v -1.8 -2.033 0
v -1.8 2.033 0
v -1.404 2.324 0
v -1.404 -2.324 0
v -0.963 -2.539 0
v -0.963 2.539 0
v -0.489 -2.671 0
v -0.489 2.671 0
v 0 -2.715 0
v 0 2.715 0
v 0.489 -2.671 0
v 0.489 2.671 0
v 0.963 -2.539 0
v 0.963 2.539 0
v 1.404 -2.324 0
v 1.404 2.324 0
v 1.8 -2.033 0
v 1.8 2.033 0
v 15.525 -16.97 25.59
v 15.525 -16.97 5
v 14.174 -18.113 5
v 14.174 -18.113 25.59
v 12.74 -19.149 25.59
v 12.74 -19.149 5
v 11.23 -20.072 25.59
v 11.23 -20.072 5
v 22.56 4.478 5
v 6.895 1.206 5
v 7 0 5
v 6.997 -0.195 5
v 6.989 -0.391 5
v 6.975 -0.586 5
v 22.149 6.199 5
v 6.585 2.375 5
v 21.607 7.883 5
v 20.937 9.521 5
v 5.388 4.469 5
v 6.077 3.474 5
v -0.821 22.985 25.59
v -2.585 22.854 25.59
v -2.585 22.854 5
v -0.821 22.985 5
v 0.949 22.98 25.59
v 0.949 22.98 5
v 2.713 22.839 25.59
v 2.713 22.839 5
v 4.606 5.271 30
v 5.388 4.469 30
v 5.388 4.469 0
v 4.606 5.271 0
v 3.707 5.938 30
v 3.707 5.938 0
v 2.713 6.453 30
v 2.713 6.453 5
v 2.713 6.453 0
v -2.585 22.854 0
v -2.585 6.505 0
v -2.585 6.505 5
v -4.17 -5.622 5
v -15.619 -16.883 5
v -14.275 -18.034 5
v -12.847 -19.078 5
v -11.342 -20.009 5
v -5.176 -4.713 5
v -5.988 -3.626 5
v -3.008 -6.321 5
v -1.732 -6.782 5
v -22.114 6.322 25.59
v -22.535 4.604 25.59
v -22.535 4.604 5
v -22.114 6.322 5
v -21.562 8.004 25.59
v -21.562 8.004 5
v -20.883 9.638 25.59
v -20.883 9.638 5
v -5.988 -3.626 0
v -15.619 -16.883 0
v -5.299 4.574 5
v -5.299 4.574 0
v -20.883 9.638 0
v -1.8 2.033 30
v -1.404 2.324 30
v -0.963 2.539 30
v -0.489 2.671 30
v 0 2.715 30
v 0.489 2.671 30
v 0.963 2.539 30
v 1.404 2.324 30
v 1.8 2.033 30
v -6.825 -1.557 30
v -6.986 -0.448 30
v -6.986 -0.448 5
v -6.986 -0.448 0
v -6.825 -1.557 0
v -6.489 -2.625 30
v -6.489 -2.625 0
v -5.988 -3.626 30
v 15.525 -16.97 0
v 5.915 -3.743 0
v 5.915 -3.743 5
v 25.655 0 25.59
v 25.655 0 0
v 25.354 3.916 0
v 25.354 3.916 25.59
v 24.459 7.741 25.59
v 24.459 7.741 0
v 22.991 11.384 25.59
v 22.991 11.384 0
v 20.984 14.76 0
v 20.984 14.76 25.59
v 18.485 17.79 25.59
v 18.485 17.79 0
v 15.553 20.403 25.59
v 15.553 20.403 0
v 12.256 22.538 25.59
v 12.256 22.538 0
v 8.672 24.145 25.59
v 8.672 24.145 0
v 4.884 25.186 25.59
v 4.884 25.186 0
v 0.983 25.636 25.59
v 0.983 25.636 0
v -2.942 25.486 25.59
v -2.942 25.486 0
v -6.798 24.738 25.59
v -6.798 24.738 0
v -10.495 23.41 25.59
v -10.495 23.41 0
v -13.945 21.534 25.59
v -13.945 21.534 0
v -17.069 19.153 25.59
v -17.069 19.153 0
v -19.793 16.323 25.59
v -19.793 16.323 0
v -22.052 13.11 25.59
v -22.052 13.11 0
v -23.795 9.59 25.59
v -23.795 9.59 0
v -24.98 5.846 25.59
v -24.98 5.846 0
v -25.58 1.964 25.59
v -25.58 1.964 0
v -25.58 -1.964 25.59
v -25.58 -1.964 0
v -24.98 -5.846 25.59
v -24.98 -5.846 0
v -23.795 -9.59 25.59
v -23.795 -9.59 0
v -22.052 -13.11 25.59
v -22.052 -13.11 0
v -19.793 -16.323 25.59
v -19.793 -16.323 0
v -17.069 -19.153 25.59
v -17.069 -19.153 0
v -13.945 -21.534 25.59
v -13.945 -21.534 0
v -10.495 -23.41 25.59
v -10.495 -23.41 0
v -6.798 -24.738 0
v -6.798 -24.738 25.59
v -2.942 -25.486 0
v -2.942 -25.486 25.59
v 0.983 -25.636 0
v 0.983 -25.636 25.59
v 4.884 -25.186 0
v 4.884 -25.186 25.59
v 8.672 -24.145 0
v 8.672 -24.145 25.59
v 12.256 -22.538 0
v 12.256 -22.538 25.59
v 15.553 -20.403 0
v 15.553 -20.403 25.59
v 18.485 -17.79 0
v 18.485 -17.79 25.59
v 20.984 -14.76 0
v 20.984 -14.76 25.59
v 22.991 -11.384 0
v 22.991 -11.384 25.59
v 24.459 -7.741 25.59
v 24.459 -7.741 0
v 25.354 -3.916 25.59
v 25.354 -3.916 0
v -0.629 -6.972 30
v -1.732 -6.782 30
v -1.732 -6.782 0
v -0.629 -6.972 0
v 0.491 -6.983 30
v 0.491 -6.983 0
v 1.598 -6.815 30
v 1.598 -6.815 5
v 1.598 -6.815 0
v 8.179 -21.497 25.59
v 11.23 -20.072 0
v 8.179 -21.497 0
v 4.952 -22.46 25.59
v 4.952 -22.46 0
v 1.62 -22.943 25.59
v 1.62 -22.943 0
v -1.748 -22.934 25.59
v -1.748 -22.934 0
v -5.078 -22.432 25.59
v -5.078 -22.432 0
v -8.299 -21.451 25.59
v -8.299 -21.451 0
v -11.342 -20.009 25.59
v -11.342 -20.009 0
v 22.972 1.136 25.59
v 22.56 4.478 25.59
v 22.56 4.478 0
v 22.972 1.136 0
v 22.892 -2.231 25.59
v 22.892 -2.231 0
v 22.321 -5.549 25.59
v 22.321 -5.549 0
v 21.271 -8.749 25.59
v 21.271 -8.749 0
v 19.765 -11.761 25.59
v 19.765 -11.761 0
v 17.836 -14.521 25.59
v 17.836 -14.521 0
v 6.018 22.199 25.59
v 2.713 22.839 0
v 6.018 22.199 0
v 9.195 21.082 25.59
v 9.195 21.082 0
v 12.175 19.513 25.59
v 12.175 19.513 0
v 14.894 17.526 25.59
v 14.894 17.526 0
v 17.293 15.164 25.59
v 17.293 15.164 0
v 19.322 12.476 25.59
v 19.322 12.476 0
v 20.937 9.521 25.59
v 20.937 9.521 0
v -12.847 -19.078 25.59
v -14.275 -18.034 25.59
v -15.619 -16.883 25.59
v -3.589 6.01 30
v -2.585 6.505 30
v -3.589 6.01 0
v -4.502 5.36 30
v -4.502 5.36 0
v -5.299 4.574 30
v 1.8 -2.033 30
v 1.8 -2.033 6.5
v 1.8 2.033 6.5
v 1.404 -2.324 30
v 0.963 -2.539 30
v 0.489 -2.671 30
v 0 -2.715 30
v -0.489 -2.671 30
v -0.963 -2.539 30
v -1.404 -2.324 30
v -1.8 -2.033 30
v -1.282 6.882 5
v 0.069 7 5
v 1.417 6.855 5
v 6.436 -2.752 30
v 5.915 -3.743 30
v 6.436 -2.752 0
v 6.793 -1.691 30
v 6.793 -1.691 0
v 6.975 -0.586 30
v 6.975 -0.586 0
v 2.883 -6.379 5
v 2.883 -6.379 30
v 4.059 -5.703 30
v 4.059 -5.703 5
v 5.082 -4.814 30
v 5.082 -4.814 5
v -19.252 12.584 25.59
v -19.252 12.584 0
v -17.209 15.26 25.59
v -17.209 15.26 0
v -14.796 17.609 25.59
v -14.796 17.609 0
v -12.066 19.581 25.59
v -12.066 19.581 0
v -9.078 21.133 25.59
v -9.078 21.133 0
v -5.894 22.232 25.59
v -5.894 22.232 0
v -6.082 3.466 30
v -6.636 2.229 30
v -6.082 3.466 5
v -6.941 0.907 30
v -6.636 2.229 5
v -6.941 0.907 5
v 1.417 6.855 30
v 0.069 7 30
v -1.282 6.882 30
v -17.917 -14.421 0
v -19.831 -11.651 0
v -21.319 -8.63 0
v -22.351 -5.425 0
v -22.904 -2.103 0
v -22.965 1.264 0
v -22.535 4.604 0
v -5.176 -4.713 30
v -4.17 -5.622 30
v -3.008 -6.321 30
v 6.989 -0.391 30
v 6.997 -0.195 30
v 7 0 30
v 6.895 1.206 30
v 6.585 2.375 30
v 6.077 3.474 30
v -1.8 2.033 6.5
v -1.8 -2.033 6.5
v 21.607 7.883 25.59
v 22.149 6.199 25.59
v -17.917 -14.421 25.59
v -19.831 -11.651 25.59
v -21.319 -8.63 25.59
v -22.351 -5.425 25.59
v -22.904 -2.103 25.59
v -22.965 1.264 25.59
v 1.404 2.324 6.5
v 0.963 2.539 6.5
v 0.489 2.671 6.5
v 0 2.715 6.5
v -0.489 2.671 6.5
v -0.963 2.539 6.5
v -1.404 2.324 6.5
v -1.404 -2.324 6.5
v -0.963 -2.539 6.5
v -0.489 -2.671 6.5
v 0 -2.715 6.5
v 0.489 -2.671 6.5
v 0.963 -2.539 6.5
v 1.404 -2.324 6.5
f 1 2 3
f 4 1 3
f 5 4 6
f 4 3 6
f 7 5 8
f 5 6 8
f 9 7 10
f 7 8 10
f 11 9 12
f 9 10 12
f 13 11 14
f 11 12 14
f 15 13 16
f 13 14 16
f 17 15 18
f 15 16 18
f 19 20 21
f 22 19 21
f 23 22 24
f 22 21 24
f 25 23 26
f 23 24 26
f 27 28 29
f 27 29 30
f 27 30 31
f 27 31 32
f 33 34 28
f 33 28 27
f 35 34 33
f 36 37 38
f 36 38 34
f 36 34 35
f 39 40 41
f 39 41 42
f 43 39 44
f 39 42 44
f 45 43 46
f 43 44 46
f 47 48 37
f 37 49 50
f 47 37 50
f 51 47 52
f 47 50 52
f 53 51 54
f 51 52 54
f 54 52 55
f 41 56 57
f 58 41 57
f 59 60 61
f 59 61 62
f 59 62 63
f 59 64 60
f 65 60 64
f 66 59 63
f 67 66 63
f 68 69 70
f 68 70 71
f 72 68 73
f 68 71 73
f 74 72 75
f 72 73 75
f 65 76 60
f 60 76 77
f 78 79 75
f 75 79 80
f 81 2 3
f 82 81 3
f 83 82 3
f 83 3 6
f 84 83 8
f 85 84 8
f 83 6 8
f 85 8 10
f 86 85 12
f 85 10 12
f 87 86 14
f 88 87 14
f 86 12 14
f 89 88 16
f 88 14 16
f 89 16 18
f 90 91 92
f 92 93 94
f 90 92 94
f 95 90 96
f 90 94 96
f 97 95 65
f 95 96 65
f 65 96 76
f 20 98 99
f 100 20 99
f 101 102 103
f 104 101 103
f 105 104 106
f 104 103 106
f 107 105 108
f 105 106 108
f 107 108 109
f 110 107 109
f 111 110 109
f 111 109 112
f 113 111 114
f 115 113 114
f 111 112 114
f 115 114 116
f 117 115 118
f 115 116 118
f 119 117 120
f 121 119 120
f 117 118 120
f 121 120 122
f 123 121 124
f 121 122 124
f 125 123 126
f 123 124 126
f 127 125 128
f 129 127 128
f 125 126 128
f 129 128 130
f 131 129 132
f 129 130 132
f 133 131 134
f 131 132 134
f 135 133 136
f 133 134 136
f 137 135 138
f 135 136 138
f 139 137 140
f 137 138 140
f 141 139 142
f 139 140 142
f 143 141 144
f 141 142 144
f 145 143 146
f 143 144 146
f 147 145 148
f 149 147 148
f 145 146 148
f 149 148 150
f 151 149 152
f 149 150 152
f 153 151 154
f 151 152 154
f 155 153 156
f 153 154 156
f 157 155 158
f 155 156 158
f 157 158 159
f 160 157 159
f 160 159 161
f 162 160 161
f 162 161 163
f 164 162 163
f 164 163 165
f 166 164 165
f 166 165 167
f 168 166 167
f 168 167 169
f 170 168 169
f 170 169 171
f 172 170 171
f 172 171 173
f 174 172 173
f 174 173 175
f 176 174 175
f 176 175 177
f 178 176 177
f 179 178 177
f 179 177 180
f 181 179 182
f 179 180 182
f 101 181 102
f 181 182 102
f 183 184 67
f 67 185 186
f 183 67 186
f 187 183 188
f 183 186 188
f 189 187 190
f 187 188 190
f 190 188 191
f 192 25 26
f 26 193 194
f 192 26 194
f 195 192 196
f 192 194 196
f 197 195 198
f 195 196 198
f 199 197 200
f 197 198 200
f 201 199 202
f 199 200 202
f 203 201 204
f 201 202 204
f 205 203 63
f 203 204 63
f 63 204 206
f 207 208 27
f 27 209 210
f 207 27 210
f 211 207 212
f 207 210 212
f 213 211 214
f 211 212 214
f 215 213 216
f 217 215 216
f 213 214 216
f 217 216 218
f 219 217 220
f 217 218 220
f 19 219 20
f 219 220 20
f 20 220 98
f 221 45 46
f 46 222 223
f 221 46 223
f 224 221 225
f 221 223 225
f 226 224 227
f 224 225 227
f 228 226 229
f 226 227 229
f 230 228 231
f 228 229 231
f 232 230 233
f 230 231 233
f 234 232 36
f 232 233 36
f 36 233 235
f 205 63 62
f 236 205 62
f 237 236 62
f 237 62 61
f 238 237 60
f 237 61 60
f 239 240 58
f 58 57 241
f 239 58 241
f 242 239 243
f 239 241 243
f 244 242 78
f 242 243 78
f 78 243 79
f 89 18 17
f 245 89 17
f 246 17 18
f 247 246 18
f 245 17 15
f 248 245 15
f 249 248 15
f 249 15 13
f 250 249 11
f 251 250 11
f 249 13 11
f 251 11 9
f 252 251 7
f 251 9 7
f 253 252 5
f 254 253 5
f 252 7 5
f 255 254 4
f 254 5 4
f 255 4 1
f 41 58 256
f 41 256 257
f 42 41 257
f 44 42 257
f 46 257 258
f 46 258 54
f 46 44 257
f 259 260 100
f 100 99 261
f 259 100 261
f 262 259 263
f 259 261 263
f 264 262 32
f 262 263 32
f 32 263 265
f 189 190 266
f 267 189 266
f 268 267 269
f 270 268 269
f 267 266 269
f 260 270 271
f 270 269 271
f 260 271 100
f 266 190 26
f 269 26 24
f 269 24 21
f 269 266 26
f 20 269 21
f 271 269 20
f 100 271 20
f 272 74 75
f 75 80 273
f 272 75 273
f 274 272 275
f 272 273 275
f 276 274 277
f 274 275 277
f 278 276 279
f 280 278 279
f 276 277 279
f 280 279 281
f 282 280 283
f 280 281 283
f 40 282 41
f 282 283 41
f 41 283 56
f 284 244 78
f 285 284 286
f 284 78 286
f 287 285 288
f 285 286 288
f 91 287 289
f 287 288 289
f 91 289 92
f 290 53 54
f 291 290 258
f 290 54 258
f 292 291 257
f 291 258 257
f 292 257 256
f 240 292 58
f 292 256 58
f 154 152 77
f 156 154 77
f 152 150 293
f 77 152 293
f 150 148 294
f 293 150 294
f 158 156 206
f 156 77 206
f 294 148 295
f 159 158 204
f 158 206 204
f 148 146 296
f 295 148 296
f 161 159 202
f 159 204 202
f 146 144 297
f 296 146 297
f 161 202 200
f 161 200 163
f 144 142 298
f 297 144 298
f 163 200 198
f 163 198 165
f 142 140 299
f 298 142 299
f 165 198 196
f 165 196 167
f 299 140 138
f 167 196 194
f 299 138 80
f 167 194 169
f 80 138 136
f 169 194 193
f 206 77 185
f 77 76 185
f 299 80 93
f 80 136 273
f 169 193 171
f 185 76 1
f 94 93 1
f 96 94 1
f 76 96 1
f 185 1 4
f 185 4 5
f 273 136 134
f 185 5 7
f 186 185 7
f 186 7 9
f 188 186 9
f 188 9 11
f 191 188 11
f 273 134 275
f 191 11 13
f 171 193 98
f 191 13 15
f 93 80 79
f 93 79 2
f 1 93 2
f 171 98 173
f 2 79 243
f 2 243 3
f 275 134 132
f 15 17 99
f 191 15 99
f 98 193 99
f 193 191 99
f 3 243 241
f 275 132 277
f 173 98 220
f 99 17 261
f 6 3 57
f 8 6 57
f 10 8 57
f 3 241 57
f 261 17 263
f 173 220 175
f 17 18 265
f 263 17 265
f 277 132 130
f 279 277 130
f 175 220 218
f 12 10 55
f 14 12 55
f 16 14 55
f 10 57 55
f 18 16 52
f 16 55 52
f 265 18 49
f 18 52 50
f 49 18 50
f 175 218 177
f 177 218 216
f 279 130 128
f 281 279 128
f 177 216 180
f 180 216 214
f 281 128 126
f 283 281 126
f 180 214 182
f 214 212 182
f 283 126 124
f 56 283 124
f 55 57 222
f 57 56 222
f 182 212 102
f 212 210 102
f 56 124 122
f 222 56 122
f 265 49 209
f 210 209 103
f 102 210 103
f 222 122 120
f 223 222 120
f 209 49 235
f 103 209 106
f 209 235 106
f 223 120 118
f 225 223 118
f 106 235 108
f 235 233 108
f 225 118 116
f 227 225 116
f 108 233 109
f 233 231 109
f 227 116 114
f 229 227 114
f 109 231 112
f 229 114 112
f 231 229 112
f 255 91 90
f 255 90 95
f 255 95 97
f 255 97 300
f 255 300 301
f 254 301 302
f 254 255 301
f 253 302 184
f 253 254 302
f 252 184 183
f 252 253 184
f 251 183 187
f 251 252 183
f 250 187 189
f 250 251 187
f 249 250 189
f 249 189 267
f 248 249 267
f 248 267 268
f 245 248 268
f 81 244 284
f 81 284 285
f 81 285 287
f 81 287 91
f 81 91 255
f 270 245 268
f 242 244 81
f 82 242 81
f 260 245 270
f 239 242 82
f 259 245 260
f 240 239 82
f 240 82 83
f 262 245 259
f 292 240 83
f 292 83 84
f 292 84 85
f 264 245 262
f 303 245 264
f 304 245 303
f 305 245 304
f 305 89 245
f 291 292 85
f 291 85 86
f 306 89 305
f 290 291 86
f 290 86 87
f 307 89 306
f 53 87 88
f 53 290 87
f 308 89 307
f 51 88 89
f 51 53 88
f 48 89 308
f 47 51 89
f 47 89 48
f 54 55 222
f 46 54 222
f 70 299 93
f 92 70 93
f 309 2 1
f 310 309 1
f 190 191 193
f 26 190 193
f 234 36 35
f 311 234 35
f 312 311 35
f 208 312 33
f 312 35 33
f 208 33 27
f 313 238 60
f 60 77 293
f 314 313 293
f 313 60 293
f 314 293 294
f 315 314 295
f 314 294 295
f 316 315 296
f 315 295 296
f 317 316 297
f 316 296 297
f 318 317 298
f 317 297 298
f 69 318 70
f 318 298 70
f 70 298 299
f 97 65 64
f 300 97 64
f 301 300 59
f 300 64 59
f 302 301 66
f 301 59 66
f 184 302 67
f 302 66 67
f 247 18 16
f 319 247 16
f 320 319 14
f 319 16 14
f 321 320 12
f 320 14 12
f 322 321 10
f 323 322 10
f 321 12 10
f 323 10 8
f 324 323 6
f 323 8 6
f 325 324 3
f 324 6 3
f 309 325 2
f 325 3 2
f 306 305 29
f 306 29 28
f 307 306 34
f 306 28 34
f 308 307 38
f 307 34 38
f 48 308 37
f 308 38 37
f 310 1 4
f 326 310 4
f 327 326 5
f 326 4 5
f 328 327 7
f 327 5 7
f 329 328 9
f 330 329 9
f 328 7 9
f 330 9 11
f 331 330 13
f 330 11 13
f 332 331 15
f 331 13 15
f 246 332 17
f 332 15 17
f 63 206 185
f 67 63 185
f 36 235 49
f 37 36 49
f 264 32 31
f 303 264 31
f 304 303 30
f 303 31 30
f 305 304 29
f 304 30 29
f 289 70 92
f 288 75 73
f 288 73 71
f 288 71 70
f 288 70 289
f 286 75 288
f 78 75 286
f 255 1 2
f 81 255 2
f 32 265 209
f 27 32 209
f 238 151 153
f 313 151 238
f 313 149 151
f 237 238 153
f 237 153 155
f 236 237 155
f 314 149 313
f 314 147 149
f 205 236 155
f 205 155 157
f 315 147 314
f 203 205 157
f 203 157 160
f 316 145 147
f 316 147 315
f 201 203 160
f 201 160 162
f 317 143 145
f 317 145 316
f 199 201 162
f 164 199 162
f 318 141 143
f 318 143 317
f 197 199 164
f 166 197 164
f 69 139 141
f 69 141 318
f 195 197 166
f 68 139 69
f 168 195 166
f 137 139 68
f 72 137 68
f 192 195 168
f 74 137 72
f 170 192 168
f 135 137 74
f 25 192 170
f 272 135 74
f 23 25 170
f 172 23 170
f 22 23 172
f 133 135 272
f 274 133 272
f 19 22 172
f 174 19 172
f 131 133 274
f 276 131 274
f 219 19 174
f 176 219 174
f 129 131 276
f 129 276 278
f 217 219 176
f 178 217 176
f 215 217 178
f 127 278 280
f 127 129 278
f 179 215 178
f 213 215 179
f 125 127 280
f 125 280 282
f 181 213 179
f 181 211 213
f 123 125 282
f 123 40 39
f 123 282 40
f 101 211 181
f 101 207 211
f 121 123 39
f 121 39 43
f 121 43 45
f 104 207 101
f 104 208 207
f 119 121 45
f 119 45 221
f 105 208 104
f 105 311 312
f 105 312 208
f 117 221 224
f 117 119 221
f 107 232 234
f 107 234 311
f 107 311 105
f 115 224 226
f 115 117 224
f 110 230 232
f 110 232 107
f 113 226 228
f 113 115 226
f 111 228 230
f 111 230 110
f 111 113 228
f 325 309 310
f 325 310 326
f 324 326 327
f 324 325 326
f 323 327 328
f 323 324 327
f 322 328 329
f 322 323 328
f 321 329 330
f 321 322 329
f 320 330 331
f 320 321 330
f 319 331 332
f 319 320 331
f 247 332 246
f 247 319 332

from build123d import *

# Parameters (mm, degrees)
F1_DEPTH = 6.5
F0_R     = 25.655
F2_DEPTH = 25.59
F3_DEPTH = 5
F4_DEPTH = 30


# Not quite as in the source:
# - a feature names something its author has since deleted; it is built from what else it names


with BuildPart() as f1:
    # F0 (on Top) → F1 (new body)
    with BuildSketch(Plane.XY):
        with BuildLine():
            Line((-1.8, 2.0325415125), (-1.8, -2.0325415125))
            ThreePointArc((-1.8, -2.0325415125), (0, -2.715), (1.8, -2.0325415125))
            Line((1.8, -2.0325415125), (1.8, 2.0325415125))
            ThreePointArc((1.8, 2.0325415125), (0, 2.715), (-1.8, 2.0325415125))
        make_face()
    extrude(amount=F1_DEPTH)


with BuildPart() as f2:
    # F0 (on Top) → F2 (new body)
    with BuildSketch(Plane.XY):
        Circle(F0_R)
        with BuildLine():
            ThreePointArc((2.712572027, 22.8394823277), (13.5709320481, 18.5695935159), (20.9368695862, 9.5208976432))
            ThreePointArc((20.9368695862, 9.5208976432), (21.8940478661, 7.0463230153), (22.5598693514, 4.4779788798))
            ThreePointArc((22.5598693514, 4.4779788798), (22.8897028714, 2.2497783133), (23, 0))
            ThreePointArc((23, 0), (21.0483905071, -9.2717450925), (15.5247602556, -16.9700270773))
            ThreePointArc((15.5247602556, -16.9700270773), (13.4670842859, -18.6450433316), (11.2301940139, -20.0719391791))
            ThreePointArc((11.2301940139, -20.0719391791), (-0.0641814467, -22.9999104507), (-11.342040081, -20.0089511669))
            ThreePointArc((-11.342040081, -20.0089511669), (-13.5709320481, -18.5695935159), (-15.6192277505, -16.8831195126))
            ThreePointArc((-15.6192277505, -16.8831195126), (-21.8940478661, -7.0463230153), (-22.5345265275, 4.6038151769))
            ThreePointArc((-22.5345265275, 4.6038151769), (-21.8543815506, 7.1684033815), (-20.8834076418, 9.6375974842))
            ThreePointArc((-20.8834076418, 9.6375974842), (-13.4670842859, 18.6450433316), (-2.5850632334, 22.8542654242))
            ThreePointArc((-2.5850632334, 22.8542654242), (0.0641814467, 22.9999104507), (2.712572027, 22.8394823277))
        make_face(mode=Mode.SUBTRACT)
    extrude(amount=F2_DEPTH)

    # F0 (on Top) → F3 (join)
    with BuildSketch(Plane.XY):
        with BuildLine():
            ThreePointArc((-2.5850632334, 6.5051862448), (0.0688764893, 6.9996611367), (2.712572027, 6.4530576472))
            Line((2.712572027, 6.4530576472), (2.712572027, 22.8394823277))
            ThreePointArc((2.712572027, 22.8394823277), (0.0641814467, 22.9999104507), (-2.5850632334, 22.8542654242))
            Line((-2.5850632334, 22.8542654242), (-2.5850632334, 6.5051862448))
        make_face()
        with BuildLine():
            ThreePointArc((-6.9856282385, -0.4483281319), (-6.6357893302, 2.2285196801), (-5.2989916706, 4.5739137808))
            Line((-5.2989916706, 4.5739137808), (-20.8834076418, 9.6375974842))
            ThreePointArc((-20.8834076418, 9.6375974842), (-21.8543815506, 7.1684033815), (-22.5345265275, 4.6038151769))
            Line((-22.5345265275, 4.6038151769), (-6.9856282385, -0.4483281319))
        make_face()
        with BuildLine():
            Line((-11.342040081, -20.0089511669), (-1.7322924508, -6.7822682684))
            ThreePointArc((-1.7322924508, -6.7822682684), (-4.1700198376, -5.6223602298), (-5.9875289855, -3.6262234691))
            Line((-5.9875289855, -3.6262234691), (-15.6192277505, -16.8831195126))
            ThreePointArc((-15.6192277505, -16.8831195126), (-13.5709320481, -18.5695935159), (-11.342040081, -20.0089511669))
        make_face()
        with BuildLine():
            Line((15.5247602556, -16.9700270773), (5.9150126254, -3.7433441788))
            ThreePointArc((5.9150126254, -3.7433441788), (4.0585753368, -5.7033293992), (1.5984952489, -6.8150431355))
            Line((1.5984952489, -6.8150431355), (11.2301940139, -20.0719391791))
            ThreePointArc((11.2301940139, -20.0719391791), (13.4670842859, -18.6450433316), (15.5247602556, -16.9700270773))
        make_face()
        with BuildLine():
            ThreePointArc((5.3879712972, 4.4687543343), (6.584671559, 2.3753106028), (7, 0))
            ThreePointArc((7, 0), (6.9938606528, -0.2931094833), (6.9754533802, -0.5857048235))
            Line((6.9754533802, -0.5857048235), (22.5598693514, 4.4779788798))
            ThreePointArc((22.5598693514, 4.4779788798), (21.8940478661, 7.0463230153), (20.9368695862, 9.5208976432))
            Line((20.9368695862, 9.5208976432), (5.3879712972, 4.4687543343))
        make_face()
    extrude(amount=F3_DEPTH)

    # F0 (on Top) → F4 (join)
    with BuildSketch(Plane.XY):
        with BuildLine():
            ThreePointArc((6.9754533802, -0.5857048235), (6.9938606528, -0.2931094833), (7, 0))
            ThreePointArc((7, 0), (6.584671559, 2.3753106028), (5.3879712972, 4.4687543343))
            ThreePointArc((5.3879712972, 4.4687543343), (4.1700198376, 5.6223602298), (2.712572027, 6.4530576472))
            ThreePointArc((2.712572027, 6.4530576472), (0.0688764893, 6.9996611367), (-2.5850632334, 6.5051862448))
            ThreePointArc((-2.5850632334, 6.5051862448), (-4.0585753368, 5.7033293992), (-5.2989916706, 4.5739137808))
            ThreePointArc((-5.2989916706, 4.5739137808), (-6.6357893302, 2.2285196801), (-6.9856282385, -0.4483281319))
            ThreePointArc((-6.9856282385, -0.4483281319), (-6.6783573417, -2.0975088121), (-5.9875289855, -3.6262234691))
            ThreePointArc((-5.9875289855, -3.6262234691), (-4.1700198376, -5.6223602298), (-1.7322924508, -6.7822682684))
            ThreePointArc((-1.7322924508, -6.7822682684), (-0.0688764893, -6.9996611367), (1.5984952489, -6.8150431355))
            ThreePointArc((1.5984952489, -6.8150431355), (4.0585753368, -5.7033293992), (5.9150126254, -3.7433441788))
            ThreePointArc((5.9150126254, -3.7433441788), (6.6357893302, -2.2285196801), (6.9754533802, -0.5857048235))
        make_face()
        with BuildLine():
            ThreePointArc((1.8, -2.0325415125), (0, -2.715), (-1.8, -2.0325415125))
            Line((-1.8, -2.0325415125), (-1.8, 2.0325415125))
            ThreePointArc((-1.8, 2.0325415125), (0, 2.715), (1.8, 2.0325415125))
            Line((1.8, 2.0325415125), (1.8, -2.0325415125))
        make_face(mode=Mode.SUBTRACT)
    extrude(amount=F4_DEPTH)


solid = Compound([f1.part, f2.part])
